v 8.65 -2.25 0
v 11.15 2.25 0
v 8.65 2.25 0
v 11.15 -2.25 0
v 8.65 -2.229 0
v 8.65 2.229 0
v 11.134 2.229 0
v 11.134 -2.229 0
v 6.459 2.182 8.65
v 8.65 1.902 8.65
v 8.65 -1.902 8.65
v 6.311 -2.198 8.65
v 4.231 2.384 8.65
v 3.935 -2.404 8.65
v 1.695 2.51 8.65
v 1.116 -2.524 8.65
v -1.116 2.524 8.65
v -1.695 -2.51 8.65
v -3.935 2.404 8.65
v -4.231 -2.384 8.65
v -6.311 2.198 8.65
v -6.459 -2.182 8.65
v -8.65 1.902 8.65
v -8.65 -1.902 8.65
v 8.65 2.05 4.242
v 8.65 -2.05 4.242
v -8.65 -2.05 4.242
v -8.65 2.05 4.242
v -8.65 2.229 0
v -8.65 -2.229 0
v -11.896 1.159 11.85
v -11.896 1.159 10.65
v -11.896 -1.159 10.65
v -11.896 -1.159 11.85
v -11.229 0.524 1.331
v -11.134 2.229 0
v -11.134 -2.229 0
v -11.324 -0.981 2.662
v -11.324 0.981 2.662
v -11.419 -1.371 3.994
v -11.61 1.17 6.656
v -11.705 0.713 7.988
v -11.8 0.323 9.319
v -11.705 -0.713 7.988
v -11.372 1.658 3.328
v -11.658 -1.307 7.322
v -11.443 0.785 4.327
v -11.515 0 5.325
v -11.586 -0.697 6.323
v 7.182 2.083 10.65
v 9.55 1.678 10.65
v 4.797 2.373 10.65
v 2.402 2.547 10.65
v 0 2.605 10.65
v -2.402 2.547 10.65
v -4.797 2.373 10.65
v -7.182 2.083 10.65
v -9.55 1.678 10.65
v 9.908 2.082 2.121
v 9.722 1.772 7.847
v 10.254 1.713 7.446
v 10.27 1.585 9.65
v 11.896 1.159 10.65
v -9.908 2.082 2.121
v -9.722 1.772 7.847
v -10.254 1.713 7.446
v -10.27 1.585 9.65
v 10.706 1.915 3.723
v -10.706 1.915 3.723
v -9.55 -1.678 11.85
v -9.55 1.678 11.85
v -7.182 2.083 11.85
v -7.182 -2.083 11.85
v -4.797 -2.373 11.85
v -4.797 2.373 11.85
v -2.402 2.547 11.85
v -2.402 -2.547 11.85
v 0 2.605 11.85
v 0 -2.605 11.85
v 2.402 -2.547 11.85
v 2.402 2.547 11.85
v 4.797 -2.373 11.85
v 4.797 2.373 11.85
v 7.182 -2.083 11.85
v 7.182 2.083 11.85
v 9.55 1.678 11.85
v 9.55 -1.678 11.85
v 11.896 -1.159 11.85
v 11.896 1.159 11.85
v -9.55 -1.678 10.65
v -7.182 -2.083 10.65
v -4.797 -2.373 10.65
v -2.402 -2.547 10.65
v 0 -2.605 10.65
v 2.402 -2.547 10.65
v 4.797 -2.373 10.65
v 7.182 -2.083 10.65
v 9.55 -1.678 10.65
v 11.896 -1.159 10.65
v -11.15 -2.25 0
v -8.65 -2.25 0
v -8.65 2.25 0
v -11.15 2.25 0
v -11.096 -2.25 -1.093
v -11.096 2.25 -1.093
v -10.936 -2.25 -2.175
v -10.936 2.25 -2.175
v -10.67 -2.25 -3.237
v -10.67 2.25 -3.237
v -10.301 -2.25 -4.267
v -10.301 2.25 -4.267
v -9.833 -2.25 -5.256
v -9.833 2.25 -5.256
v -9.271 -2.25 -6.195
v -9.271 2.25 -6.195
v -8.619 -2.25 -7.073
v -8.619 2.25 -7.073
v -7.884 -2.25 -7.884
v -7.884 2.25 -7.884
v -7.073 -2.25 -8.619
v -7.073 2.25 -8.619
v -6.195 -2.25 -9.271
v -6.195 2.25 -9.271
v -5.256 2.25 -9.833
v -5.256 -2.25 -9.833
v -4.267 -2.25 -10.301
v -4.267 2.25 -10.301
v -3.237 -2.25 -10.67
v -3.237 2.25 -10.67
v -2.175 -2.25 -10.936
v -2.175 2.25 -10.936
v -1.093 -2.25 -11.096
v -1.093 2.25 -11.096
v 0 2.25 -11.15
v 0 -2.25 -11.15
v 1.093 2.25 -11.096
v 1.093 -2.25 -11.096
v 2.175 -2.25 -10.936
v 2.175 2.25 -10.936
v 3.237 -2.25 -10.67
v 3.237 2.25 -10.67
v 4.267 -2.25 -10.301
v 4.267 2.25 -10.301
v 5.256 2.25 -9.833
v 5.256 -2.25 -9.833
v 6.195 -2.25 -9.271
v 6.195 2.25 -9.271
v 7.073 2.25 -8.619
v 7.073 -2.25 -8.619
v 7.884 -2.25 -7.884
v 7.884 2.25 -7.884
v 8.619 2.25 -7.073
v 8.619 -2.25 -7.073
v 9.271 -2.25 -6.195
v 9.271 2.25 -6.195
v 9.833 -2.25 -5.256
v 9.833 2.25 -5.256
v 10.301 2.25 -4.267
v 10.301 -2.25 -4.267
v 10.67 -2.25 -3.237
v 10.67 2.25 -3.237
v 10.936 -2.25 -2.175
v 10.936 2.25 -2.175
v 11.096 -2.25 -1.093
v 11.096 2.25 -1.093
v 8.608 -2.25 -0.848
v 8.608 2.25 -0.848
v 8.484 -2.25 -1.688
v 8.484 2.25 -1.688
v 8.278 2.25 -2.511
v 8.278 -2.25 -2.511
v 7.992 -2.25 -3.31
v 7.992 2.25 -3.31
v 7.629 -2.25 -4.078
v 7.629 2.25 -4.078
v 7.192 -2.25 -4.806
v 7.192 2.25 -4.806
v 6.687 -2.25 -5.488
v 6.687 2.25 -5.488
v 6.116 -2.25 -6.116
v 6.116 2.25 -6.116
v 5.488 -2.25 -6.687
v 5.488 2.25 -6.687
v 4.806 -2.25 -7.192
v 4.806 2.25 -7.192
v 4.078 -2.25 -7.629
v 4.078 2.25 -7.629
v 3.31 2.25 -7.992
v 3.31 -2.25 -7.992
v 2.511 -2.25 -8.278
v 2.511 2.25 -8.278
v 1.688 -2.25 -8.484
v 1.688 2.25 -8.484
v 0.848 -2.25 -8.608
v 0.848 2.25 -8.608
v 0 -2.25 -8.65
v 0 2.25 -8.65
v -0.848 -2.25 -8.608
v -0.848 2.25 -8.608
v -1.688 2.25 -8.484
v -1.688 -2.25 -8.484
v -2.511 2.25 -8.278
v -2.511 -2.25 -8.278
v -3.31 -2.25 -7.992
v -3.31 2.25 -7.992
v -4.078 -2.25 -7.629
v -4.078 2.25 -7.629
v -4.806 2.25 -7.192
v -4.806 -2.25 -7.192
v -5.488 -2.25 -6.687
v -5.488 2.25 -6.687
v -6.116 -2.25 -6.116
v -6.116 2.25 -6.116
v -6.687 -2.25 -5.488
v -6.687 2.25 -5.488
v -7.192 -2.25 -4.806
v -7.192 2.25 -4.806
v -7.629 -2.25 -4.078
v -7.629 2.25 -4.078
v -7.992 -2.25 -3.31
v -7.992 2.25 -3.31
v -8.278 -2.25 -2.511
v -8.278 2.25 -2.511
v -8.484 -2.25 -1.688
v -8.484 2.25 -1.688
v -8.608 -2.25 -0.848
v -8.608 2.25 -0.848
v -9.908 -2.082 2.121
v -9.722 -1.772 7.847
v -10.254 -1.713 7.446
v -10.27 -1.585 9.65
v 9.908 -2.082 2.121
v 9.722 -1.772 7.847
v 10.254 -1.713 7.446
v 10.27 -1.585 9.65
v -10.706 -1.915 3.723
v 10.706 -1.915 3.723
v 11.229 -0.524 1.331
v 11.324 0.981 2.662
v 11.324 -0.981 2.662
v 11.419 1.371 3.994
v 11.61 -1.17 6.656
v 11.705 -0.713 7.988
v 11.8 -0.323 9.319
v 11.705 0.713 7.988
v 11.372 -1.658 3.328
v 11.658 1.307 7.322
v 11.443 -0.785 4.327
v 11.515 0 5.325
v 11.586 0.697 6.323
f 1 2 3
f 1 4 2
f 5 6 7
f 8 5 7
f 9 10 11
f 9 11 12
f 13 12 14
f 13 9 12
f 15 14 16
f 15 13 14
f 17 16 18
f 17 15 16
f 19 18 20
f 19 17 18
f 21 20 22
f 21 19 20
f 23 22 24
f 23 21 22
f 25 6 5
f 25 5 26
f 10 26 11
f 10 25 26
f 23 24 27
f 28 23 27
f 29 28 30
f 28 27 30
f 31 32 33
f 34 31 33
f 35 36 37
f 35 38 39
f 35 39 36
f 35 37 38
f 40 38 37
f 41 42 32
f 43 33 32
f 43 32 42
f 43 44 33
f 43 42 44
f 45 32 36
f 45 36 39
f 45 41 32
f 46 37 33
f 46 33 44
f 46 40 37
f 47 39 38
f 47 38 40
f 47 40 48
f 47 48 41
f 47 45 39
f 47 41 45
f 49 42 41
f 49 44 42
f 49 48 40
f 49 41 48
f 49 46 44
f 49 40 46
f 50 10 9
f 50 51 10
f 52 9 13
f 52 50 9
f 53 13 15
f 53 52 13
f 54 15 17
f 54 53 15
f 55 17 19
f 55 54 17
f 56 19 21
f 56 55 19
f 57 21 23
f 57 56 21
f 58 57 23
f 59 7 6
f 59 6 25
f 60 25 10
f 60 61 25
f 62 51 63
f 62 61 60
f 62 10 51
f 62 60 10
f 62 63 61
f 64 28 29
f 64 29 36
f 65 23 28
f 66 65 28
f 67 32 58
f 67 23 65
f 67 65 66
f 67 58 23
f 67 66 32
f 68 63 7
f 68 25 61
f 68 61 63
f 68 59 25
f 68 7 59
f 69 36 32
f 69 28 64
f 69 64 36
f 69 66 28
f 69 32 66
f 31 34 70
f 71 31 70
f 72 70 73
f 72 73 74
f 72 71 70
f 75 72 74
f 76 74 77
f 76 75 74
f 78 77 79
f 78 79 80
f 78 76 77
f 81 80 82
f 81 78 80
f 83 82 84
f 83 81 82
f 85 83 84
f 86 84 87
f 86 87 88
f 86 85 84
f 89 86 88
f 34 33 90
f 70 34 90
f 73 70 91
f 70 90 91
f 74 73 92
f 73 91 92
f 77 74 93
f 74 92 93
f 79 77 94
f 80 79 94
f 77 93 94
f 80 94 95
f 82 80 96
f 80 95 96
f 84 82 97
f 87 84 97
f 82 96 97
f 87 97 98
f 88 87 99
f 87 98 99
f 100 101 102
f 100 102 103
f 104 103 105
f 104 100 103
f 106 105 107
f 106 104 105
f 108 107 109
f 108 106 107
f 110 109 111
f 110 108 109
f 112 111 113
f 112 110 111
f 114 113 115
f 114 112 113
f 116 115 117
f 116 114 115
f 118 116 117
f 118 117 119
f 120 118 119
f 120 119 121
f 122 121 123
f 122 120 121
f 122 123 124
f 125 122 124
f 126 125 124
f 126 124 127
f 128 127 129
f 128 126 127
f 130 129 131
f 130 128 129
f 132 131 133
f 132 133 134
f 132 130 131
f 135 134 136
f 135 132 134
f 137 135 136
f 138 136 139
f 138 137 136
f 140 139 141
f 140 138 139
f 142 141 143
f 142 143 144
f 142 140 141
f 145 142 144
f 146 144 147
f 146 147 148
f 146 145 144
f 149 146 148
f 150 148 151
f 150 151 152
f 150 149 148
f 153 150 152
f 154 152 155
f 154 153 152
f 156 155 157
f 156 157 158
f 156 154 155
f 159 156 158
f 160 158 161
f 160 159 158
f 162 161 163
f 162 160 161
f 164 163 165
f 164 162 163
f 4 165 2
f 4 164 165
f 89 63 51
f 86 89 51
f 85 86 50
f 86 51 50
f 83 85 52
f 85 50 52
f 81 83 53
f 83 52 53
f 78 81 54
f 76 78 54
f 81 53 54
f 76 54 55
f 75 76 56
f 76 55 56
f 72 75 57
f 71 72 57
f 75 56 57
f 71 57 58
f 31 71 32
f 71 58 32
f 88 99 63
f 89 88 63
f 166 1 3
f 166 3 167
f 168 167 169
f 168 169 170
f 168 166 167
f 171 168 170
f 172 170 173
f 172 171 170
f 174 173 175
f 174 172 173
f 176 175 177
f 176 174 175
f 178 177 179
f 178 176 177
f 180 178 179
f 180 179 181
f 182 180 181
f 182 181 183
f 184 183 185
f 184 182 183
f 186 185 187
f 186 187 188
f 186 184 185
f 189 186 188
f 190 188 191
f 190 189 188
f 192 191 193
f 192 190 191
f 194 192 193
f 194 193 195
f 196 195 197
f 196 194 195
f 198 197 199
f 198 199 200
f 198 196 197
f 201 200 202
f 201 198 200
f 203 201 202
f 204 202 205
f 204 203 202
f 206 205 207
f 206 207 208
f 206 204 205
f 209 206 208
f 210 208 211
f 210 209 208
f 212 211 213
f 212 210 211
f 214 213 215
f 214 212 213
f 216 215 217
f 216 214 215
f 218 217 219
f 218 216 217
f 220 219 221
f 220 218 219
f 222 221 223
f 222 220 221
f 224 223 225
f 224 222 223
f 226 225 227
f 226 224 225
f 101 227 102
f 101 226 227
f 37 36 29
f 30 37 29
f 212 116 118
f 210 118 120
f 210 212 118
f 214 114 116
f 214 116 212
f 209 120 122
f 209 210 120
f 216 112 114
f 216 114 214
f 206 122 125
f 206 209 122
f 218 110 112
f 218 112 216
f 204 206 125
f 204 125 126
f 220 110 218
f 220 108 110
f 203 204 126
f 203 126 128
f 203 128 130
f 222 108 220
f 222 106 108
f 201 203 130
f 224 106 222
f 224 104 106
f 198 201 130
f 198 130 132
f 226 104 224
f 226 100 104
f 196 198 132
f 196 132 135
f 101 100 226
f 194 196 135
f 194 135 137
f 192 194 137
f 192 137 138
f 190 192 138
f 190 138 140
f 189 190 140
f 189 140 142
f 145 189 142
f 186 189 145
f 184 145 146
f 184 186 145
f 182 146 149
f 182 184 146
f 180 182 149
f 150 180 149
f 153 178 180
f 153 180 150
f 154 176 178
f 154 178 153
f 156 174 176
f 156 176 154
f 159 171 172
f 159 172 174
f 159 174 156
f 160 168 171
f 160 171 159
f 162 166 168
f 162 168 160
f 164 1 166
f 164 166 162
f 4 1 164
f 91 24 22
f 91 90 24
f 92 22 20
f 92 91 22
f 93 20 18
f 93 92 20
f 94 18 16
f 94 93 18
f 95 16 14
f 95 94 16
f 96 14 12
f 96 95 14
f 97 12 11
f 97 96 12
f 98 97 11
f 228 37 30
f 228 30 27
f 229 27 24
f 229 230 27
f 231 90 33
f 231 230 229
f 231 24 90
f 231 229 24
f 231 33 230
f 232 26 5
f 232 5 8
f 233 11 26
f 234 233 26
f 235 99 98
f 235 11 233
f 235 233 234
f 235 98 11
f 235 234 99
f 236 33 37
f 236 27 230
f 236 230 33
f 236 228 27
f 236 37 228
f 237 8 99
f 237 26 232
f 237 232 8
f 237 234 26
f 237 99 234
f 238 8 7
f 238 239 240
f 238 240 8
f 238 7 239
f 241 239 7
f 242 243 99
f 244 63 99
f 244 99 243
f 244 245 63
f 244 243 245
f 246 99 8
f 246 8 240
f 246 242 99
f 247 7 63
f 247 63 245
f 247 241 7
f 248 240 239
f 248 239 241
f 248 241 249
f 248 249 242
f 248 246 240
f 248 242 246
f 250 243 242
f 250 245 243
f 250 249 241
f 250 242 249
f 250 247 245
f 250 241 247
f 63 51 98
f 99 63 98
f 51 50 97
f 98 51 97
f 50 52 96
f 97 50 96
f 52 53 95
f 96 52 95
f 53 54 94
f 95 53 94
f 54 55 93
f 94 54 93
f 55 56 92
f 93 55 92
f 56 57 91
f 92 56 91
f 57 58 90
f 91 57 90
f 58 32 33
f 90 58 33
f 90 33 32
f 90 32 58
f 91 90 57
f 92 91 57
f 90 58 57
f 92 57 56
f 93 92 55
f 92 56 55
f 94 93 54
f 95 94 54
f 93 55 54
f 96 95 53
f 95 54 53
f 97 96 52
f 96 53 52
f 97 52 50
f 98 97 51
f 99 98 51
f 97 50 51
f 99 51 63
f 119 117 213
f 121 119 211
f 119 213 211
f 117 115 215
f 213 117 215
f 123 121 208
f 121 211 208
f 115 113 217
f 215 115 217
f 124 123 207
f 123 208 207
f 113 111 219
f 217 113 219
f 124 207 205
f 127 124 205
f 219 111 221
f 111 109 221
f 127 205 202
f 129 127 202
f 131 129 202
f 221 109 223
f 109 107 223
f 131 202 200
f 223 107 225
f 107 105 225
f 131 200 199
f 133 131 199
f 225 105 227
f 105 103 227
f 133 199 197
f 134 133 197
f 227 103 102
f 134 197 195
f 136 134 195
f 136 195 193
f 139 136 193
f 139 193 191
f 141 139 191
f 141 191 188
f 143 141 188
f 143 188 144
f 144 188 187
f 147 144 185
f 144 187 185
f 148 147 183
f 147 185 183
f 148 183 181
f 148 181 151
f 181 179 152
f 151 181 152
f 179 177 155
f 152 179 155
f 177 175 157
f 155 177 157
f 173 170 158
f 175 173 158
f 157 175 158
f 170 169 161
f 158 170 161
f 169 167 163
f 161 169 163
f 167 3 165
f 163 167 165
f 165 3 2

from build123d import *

# Parameters (mm, degrees)
F1_DEPTH      = 2.25
F1_DEPTH_BACK = 2.25
F3_START      = 10.65
F3_DEPTH      = 1.2
F4_W          = 22.2676340491
F4_H          = 4.4576479122
F6_DEPTH      = 25
F6_DEPTH_BACK = 25


with BuildPart() as f1:
    # F0 (on Front) → F1 (new body, two sides)
    with BuildSketch(Plane.XZ) as f1_sk:
        with BuildLine():
            Line((11.15, 0), (8.65, 0))
            ThreePointArc((8.65, 0), (0, -8.65), (-8.65, 0))
            Line((-8.65, 0), (-11.15, 0))
            ThreePointArc((-11.15, 0), (0, -11.15), (11.15, 0))
        make_face()
    extrude(amount=F1_DEPTH)
    extrude(f1_sk.sketch, amount=-F1_DEPTH_BACK)


with BuildPart() as f3:
    # F2 (on Top) → F3 (new body)
    with BuildSketch(Plane.XY.offset(F3_START)):
        with BuildLine():
            Line((-11.89556811, 1.1590829818), (-11.89556811, 0))
            Line((-11.89556811, 0), (-11.89556811, -1.1590829818))
            ThreePointArc((-11.89556811, -1.1590829818), (0, -2.6051300839), (11.89556811, -1.1590829818))
            Line((11.89556811, -1.1590829818), (11.89556811, 0))
            Line((11.89556811, 0), (11.89556811, 1.1590829818))
            ThreePointArc((11.89556811, 1.1590829818), (0, 2.6051300839), (-11.89556811, 1.1590829818))
        make_face()
    extrude(amount=F3_DEPTH)


with BuildPart() as f5:
    # F4 (on Top) → F5 section 0
    with BuildSketch(Plane.XY):
        Rectangle(F4_W, F4_H)
    # F3_face (on face) → F5 section 1
    with BuildSketch(Plane(origin=(0, 0, 10.65), x_dir=(1, 0, 0), z_dir=(0, 0, -1))):
        with BuildLine():
            Line((-11.89556811, 1.1590829818), (-11.89556811, -1.1590829818))
            ThreePointArc((-11.89556811, -1.1590829818), (0, -2.6051300839), (11.89556811, -1.1590829818))
            Line((11.89556811, -1.1590829818), (11.89556811, 1.1590829818))
            ThreePointArc((11.89556811, 1.1590829818), (0, 2.6051300839), (-11.89556811, 1.1590829818))
        make_face()
    loft()

    # F0 (on Front) → F6 (cut, two sides)
    with BuildSketch(Plane.XZ) as f6_sk:
        with BuildLine():
            Line((-8.65, 0), (8.65, 0))
            ThreePointArc((8.65, 0), (6.1164736573, 6.1164736573), (0, 8.65))
            ThreePointArc((0, 8.65), (-6.1164736573, 6.1164736573), (-8.65, 0))
        make_face()
        with BuildLine():
            ThreePointArc((0, 8.65), (6.1164736573, 6.1164736573), (8.65, 0))
            Line((8.65, 0), (8.65, 7.0356236397))
            ThreePointArc((8.65, 7.0356236397), (7.8842406102, 7.8842406102), (7.0356236397, 8.65))
            Line((7.0356236397, 8.65), (0, 8.65))
        make_face()
        with BuildLine():
            ThreePointArc((7.0356236397, 8.65), (7.8842406102, 7.8842406102), (8.65, 7.0356236397))
            Line((8.65, 7.0356236397), (8.65, 8.65))
            Line((8.65, 8.65), (7.0356236397, 8.65))
        make_face()
        with BuildLine():
            ThreePointArc((-8.65, 0), (-6.1164736573, 6.1164736573), (0, 8.65))
            Line((0, 8.65), (-7.0356236397, 8.65))
            ThreePointArc((-7.0356236397, 8.65), (-7.8842406102, 7.8842406102), (-8.65, 7.0356236397))
            Line((-8.65, 7.0356236397), (-8.65, 0))
        make_face()
        with BuildLine():
            ThreePointArc((-8.65, 7.0356236397), (-7.8842406102, 7.8842406102), (-7.0356236397, 8.65))
            Line((-7.0356236397, 8.65), (-8.65, 8.65))
            Line((-8.65, 8.65), (-8.65, 7.0356236397))
        make_face()
    extrude(amount=-F6_DEPTH, mode=Mode.SUBTRACT)
    extrude(f6_sk.sketch, amount=F6_DEPTH_BACK, mode=Mode.SUBTRACT)


solid = Compound([f1.part, f3.part, f5.part])
